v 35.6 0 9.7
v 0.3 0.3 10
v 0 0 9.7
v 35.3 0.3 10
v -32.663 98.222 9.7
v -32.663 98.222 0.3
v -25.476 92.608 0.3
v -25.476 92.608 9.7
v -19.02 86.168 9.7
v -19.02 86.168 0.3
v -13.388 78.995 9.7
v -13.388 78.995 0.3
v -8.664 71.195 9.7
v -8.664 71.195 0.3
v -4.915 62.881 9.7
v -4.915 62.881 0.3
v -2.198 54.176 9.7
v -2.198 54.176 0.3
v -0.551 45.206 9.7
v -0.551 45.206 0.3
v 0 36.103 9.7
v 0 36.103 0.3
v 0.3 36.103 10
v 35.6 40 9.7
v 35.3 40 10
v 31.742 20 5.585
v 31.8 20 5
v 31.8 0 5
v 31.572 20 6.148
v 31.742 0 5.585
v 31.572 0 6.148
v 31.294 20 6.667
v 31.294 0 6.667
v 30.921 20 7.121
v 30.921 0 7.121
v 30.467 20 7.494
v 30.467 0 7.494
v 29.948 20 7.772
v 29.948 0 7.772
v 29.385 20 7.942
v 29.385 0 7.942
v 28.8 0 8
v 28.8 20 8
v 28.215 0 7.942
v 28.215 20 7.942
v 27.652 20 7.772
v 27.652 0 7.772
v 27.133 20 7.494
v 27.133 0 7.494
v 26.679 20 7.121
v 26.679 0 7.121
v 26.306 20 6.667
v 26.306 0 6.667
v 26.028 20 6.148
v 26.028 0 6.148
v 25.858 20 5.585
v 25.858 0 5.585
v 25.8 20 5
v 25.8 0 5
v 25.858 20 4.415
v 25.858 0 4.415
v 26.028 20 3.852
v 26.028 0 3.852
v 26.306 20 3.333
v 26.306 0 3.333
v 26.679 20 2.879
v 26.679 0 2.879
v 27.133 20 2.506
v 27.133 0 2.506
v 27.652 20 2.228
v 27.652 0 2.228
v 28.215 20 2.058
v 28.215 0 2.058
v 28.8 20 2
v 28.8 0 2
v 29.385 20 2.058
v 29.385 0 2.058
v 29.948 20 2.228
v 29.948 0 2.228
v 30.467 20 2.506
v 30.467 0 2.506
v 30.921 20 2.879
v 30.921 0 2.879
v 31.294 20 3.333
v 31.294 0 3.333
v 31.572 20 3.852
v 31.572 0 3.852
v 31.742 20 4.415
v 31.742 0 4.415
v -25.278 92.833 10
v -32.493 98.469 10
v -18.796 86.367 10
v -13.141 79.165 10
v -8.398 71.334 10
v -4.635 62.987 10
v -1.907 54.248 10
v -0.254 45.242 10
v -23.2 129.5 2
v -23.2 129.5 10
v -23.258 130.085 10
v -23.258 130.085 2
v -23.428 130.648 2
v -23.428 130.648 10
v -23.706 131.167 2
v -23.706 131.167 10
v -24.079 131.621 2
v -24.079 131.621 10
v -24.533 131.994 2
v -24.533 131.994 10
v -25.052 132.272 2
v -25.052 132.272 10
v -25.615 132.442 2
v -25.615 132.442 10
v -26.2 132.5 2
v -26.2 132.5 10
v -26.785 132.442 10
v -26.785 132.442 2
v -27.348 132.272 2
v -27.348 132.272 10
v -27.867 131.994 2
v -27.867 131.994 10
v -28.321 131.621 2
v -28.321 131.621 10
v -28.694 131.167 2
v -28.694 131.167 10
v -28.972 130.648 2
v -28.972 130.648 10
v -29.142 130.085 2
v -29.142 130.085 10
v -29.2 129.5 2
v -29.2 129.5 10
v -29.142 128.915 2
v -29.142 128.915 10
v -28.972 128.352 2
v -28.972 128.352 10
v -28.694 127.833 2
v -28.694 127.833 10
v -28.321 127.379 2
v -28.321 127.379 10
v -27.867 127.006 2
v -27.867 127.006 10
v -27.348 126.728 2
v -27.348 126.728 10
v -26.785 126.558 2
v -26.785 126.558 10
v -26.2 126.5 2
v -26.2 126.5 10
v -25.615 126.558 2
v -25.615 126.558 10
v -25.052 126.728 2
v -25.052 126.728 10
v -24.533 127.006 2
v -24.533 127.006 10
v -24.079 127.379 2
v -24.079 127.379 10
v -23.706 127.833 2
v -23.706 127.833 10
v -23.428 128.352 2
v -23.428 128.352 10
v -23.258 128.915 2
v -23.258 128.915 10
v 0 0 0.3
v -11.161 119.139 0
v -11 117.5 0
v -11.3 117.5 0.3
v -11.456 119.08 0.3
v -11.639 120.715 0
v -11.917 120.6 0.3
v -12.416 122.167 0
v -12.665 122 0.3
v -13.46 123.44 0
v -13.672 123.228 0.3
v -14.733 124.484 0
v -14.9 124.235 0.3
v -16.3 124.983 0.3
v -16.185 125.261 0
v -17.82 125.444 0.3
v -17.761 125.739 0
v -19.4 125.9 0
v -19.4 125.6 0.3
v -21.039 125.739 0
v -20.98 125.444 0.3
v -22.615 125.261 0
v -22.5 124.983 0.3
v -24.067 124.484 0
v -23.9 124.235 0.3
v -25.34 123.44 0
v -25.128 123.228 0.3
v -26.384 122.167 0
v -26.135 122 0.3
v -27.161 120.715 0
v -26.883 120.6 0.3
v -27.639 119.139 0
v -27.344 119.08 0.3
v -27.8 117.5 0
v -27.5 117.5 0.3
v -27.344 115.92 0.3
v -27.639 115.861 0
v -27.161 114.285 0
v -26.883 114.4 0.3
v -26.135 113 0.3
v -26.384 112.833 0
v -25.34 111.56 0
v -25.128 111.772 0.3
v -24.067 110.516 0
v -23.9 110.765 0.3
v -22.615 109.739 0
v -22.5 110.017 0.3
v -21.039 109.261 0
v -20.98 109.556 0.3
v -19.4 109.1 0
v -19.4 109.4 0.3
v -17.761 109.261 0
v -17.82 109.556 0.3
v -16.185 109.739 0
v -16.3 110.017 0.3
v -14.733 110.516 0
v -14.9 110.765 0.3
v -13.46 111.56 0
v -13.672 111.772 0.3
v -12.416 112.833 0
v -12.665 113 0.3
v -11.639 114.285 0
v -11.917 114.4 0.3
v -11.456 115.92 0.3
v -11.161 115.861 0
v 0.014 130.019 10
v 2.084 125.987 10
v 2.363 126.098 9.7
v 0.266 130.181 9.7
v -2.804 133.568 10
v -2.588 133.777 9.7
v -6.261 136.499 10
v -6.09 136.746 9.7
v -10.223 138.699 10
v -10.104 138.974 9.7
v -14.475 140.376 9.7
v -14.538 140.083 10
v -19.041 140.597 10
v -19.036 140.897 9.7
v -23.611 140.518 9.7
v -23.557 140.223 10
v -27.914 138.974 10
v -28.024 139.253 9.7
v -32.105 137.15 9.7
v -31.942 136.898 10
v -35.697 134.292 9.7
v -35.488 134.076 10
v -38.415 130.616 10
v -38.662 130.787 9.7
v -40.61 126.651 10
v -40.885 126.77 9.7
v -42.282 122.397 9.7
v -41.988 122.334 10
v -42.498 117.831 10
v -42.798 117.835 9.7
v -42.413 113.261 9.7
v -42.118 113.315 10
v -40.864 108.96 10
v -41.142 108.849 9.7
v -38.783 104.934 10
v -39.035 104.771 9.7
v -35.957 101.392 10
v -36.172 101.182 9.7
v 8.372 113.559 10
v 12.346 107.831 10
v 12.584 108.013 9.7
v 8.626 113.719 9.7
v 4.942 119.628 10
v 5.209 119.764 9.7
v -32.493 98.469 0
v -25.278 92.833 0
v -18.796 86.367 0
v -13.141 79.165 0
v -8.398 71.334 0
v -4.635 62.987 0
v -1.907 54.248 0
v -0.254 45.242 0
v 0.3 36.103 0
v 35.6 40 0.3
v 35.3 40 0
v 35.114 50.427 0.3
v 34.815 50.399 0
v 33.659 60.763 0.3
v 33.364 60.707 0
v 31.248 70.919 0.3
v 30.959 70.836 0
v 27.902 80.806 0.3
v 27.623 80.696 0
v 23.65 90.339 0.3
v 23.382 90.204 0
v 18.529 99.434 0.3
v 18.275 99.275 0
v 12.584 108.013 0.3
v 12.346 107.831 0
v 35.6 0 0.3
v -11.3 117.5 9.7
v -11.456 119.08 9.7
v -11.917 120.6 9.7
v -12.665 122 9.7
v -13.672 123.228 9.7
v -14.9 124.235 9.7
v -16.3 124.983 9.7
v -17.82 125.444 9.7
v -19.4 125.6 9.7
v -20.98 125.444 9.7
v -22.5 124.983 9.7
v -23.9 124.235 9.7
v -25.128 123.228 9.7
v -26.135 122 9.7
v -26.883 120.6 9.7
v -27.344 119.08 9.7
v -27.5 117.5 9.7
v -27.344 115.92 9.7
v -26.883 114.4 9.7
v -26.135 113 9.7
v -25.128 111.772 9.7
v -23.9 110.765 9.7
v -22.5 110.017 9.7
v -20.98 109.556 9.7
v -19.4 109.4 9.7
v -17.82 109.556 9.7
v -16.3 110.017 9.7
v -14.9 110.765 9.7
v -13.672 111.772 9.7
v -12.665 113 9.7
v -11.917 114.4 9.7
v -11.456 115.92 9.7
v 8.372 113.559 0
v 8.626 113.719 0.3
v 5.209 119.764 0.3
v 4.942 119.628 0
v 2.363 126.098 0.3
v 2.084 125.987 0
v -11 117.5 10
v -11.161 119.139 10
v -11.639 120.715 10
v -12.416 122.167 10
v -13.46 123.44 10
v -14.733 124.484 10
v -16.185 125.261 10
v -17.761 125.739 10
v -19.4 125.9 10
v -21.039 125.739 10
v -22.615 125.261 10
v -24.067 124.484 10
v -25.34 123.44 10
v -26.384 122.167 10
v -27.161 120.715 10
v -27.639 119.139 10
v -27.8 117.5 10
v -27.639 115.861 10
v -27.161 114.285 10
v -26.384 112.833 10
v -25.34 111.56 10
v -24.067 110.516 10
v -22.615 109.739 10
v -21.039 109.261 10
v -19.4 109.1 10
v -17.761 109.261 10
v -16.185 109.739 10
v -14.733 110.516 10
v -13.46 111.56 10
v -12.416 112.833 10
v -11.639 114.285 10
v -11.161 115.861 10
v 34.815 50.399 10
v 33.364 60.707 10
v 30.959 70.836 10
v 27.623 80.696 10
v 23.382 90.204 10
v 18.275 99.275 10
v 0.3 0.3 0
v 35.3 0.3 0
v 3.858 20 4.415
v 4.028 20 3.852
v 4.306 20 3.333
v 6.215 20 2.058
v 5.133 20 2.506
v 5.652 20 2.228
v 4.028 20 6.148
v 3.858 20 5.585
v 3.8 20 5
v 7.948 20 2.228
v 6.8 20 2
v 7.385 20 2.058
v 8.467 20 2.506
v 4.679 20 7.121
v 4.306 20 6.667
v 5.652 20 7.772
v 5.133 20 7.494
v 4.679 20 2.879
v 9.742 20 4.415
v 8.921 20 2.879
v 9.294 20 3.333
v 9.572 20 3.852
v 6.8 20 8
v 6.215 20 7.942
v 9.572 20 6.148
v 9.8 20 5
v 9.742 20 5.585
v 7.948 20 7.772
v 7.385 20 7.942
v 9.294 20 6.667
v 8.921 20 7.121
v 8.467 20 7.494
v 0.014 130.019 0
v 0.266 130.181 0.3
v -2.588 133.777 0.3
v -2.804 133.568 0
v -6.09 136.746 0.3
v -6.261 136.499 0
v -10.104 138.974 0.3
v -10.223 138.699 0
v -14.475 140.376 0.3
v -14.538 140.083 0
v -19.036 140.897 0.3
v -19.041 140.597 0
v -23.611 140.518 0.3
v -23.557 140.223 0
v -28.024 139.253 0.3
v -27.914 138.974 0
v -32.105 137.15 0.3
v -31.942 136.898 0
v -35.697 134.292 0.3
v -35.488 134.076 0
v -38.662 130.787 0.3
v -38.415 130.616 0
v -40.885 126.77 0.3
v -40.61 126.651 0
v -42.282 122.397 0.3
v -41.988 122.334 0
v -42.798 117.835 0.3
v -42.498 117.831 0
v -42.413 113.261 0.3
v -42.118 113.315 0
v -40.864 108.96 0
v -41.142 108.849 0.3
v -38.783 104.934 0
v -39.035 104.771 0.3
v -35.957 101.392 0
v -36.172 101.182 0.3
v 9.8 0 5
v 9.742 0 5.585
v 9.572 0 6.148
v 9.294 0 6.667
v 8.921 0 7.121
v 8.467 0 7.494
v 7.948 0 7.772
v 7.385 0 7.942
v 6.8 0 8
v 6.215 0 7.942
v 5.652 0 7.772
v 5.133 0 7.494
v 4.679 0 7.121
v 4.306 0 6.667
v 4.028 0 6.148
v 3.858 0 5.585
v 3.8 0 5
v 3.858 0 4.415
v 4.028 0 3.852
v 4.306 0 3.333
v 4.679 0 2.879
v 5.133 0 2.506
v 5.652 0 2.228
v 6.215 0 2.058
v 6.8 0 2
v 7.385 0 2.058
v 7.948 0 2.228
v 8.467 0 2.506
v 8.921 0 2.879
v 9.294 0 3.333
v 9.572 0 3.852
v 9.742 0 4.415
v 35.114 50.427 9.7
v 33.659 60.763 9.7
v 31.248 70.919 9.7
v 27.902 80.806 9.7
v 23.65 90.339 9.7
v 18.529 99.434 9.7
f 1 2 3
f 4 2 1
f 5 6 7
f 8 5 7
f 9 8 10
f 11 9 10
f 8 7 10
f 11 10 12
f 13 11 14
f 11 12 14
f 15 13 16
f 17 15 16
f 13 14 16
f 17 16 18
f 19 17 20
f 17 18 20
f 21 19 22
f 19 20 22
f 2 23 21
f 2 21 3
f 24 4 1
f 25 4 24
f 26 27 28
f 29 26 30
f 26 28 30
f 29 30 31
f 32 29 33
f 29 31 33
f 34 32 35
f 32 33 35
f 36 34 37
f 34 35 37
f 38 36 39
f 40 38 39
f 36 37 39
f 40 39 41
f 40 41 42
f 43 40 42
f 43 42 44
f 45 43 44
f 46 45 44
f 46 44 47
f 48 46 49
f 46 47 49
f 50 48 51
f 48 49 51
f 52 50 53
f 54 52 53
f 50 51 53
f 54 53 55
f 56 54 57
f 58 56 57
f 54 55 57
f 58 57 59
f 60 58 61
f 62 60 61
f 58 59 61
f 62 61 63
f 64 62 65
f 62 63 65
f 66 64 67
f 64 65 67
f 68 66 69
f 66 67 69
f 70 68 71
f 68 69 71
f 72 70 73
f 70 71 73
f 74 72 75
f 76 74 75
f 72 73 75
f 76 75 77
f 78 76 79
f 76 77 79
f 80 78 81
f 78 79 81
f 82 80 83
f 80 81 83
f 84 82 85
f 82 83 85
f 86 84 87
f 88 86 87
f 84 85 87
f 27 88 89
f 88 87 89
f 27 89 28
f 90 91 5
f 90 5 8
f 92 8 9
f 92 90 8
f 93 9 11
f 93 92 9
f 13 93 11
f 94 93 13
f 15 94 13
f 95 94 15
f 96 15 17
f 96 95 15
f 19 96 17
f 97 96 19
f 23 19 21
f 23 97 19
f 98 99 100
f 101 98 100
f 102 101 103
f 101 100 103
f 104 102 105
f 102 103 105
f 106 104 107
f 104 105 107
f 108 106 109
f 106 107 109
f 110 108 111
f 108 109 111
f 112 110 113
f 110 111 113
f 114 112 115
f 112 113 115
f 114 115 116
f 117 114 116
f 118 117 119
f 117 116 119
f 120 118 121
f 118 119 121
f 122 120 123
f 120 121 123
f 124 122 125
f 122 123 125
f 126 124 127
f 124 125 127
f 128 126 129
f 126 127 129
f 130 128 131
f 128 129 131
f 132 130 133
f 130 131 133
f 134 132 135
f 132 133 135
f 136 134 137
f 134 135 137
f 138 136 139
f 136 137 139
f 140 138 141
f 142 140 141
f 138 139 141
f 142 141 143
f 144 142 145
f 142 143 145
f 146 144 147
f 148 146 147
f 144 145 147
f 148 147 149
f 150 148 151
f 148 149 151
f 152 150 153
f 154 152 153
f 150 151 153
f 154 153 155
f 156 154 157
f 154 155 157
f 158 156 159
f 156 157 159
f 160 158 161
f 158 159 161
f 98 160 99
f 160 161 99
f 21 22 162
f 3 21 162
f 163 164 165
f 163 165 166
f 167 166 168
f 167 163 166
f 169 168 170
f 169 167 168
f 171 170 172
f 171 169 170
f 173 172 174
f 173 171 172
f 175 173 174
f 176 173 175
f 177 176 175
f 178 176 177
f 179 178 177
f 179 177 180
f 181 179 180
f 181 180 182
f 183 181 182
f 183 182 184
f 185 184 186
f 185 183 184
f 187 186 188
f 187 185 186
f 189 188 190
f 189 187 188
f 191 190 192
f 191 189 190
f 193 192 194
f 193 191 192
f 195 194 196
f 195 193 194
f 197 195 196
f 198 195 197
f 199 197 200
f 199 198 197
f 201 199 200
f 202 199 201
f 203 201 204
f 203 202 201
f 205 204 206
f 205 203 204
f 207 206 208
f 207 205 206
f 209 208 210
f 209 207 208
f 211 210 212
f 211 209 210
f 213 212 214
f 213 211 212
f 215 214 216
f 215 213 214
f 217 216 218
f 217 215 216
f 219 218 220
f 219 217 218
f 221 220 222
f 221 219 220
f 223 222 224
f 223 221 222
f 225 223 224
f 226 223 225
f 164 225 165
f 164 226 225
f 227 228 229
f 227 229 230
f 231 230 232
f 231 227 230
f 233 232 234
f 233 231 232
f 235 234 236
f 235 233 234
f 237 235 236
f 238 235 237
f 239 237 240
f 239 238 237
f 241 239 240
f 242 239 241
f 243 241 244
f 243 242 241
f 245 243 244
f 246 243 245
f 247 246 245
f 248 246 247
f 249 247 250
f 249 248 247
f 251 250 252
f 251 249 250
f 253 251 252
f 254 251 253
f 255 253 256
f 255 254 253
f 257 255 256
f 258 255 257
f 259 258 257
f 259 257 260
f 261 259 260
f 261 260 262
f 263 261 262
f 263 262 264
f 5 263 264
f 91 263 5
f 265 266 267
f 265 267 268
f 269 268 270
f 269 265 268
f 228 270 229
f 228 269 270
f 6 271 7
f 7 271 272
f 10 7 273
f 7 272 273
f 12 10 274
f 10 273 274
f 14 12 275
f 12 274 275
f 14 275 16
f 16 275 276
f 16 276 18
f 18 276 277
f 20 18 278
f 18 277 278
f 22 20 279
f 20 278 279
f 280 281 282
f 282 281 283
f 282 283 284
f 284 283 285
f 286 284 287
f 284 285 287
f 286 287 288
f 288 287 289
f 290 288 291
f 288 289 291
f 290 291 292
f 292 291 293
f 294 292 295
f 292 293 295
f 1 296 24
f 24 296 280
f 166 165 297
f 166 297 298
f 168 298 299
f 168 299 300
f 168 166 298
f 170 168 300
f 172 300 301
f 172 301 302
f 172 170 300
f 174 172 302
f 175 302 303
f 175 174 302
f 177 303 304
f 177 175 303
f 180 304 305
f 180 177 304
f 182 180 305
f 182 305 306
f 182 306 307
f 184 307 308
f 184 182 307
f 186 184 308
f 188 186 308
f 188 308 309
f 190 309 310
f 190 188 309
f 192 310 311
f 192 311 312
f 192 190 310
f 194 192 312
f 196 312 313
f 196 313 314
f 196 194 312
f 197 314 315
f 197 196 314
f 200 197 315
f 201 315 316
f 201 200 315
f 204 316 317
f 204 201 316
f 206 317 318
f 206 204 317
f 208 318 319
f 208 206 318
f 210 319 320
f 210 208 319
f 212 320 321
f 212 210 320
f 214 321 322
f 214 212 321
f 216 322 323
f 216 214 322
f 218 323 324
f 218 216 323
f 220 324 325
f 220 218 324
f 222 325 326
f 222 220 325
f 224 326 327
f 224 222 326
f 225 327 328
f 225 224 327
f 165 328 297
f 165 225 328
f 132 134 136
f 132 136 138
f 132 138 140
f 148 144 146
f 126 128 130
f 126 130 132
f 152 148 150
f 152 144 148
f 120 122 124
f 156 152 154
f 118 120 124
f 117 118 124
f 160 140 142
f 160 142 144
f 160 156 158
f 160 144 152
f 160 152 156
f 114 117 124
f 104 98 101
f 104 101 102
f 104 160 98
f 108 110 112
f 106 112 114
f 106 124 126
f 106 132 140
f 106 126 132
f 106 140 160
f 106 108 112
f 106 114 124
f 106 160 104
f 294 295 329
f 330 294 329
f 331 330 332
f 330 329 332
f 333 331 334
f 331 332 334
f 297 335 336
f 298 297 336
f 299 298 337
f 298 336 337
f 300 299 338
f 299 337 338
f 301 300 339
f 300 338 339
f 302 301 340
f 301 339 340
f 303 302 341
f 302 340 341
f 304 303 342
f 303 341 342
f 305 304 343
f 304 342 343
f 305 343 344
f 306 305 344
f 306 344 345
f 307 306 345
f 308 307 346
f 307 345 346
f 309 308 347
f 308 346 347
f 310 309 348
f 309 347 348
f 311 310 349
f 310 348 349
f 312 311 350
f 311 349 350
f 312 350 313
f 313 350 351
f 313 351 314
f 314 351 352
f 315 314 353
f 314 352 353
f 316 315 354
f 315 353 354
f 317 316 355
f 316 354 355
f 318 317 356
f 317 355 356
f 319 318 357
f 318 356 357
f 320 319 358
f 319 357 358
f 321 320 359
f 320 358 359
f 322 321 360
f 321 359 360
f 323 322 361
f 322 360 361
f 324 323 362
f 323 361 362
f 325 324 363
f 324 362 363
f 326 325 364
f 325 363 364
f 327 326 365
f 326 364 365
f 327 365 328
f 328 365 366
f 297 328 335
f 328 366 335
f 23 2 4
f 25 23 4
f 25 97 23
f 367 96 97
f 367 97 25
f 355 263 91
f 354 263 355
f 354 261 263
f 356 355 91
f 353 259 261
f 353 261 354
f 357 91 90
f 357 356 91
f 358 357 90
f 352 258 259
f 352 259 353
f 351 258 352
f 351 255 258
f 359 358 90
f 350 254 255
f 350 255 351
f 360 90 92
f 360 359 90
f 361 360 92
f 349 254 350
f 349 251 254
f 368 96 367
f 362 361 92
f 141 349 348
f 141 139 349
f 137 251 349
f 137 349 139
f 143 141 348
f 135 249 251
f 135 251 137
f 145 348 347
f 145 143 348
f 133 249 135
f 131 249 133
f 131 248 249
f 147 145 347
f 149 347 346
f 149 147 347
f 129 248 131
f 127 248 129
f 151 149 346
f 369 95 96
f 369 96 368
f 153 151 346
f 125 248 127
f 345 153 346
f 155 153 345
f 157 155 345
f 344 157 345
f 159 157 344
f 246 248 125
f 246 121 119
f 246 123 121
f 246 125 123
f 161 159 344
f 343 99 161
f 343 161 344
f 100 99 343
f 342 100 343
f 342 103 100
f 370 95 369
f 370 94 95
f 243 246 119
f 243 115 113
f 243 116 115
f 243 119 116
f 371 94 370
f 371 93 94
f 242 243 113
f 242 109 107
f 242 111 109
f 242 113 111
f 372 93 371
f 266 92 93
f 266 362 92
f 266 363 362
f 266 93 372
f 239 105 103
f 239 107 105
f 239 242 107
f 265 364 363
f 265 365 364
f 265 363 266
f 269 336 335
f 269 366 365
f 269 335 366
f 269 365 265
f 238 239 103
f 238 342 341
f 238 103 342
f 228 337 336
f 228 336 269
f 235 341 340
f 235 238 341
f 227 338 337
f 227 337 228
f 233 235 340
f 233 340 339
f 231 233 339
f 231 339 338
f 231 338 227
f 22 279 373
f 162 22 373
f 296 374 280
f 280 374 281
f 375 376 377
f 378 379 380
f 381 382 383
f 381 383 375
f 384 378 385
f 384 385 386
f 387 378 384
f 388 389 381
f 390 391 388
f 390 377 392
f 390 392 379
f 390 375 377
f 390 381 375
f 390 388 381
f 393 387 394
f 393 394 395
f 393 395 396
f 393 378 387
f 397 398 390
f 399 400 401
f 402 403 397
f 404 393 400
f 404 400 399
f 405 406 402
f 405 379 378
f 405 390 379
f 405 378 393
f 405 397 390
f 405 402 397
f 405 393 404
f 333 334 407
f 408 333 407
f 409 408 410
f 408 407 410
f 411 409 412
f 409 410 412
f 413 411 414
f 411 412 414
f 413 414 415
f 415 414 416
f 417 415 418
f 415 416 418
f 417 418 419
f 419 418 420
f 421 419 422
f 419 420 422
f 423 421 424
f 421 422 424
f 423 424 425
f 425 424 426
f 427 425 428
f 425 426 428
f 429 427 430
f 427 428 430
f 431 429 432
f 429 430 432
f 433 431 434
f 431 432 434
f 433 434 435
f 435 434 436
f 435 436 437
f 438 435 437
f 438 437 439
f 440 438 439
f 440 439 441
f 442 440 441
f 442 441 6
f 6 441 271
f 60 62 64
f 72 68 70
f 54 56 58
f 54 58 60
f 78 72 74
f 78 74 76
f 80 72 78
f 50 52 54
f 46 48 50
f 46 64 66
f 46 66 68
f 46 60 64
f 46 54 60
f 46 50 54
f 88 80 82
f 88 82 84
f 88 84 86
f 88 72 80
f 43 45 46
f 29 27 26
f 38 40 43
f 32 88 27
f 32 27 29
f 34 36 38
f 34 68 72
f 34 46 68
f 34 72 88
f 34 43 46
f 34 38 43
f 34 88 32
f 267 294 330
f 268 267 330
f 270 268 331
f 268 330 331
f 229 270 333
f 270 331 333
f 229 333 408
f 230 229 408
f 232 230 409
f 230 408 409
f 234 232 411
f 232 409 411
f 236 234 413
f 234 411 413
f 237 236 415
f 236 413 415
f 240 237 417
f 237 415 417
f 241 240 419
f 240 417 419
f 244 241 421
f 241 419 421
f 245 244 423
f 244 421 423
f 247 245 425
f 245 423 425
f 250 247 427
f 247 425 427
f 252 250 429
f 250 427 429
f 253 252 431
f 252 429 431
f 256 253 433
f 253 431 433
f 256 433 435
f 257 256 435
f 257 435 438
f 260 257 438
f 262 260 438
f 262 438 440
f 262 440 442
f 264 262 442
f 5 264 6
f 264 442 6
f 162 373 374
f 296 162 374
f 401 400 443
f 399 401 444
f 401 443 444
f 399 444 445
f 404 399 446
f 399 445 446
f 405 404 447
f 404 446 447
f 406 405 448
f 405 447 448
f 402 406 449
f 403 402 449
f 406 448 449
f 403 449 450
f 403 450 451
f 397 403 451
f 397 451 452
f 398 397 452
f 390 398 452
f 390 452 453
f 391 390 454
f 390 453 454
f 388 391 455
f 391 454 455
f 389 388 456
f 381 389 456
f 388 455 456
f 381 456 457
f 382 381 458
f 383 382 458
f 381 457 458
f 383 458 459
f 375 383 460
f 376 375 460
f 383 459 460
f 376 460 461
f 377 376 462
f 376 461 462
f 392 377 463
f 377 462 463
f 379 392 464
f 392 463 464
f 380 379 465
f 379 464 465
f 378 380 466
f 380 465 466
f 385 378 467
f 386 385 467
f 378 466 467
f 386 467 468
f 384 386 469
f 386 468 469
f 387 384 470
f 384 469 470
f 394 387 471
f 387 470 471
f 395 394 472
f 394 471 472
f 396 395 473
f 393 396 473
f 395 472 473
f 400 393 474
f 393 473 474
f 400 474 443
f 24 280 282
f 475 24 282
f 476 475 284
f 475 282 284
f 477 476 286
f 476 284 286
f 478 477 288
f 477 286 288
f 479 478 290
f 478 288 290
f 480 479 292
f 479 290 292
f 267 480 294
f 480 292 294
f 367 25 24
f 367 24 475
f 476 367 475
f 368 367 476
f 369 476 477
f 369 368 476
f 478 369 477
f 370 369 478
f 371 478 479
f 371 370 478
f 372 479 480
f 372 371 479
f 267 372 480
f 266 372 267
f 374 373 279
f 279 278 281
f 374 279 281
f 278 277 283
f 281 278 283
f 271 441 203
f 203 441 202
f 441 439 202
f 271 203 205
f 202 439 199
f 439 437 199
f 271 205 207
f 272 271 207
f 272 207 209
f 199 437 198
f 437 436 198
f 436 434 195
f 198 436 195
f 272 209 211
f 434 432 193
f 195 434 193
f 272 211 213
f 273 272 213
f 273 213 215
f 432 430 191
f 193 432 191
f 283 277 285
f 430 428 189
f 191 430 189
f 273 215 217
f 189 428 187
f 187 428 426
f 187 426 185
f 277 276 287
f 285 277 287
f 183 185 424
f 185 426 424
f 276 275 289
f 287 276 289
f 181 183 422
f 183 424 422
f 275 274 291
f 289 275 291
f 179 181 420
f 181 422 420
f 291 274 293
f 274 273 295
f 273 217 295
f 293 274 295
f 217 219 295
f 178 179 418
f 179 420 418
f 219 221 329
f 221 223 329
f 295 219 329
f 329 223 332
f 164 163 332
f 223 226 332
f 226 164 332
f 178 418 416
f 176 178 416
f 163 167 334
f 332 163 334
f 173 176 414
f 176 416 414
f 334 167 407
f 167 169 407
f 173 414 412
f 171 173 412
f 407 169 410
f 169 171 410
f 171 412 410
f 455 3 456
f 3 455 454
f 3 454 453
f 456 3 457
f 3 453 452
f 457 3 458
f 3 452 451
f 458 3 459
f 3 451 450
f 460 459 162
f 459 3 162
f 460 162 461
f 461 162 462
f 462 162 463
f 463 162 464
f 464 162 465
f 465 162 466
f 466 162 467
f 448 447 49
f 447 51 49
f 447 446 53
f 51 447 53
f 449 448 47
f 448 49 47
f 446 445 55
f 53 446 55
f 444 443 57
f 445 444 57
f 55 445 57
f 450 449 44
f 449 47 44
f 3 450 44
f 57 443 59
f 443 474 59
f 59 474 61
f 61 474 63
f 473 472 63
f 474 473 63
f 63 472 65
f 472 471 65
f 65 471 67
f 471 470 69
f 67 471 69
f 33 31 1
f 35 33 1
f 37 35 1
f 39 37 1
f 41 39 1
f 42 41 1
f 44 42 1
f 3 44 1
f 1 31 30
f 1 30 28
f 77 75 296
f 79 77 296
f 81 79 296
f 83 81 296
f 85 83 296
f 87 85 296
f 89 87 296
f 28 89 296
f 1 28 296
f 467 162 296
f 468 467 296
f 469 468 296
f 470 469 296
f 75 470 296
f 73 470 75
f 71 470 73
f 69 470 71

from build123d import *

# Parameters (mm, degrees)
F0_R     = 8.1
F1_DEPTH = 10
F2_SIZE  = 0.3
F3_R     = 3
F4_DEPTH = 8
F5_R     = 3
F6_DEPTH = 20


with BuildPart() as f1:
    # F0 (on Top) → F1 (new body)
    with BuildSketch(Plane.XY):
        with BuildLine():
            Line((0, 36.103194), (0, 0))
            Line((0, 0), (35.6, 0))
            Line((35.6, 0), (35.6, 40))
            ThreePointArc((35.6, 40), (29.690096, 75.901135), (12.584081, 108.013479))
            ThreePointArc((12.584081, 108.013479), (6.847931, 116.701894), (2.363287, 126.097635))
            ThreePointArc((2.363287, 126.097635), (-33.971495, 135.809329), (-32.663158, 98.221809))
            ThreePointArc((-32.663158, 98.221809), (-8.663511, 71.194519), (0, 36.103194))
        make_face()
        with Locations((-19.4, 117.5)):
            Circle(F0_R, mode=Mode.SUBTRACT)
    extrude(amount=F1_DEPTH)

    # F2
    f2_edges = [f1.edges().sort_by_distance(p)[0] for p in [
        (17.8, 0, 10),
        (0, 18.051597, 10),
        (-27.5, 117.5, 10),
        (29.690096, 75.901135, 0),
        (-27.5, 117.5, 0),
        (17.8, 0, 0),
    ]]
    chamfer(f2_edges, length=F2_SIZE)

    # F3 (on face) → F4 (cut)
    with BuildSketch(Plane.XY.offset(10)):
        with Locations((-26.2, 129.5)):
            Circle(F3_R)
    extrude(amount=-F4_DEPTH, mode=Mode.SUBTRACT)

    # F5 (on face) → F6 (cut)
    with BuildSketch(Plane.XZ):
        with Locations((6.8, 5)):
            Circle(F5_R)
        with Locations((28.8, 5)):
            Circle(F5_R)
    extrude(amount=-F6_DEPTH, mode=Mode.SUBTRACT)


solid = f1.part
